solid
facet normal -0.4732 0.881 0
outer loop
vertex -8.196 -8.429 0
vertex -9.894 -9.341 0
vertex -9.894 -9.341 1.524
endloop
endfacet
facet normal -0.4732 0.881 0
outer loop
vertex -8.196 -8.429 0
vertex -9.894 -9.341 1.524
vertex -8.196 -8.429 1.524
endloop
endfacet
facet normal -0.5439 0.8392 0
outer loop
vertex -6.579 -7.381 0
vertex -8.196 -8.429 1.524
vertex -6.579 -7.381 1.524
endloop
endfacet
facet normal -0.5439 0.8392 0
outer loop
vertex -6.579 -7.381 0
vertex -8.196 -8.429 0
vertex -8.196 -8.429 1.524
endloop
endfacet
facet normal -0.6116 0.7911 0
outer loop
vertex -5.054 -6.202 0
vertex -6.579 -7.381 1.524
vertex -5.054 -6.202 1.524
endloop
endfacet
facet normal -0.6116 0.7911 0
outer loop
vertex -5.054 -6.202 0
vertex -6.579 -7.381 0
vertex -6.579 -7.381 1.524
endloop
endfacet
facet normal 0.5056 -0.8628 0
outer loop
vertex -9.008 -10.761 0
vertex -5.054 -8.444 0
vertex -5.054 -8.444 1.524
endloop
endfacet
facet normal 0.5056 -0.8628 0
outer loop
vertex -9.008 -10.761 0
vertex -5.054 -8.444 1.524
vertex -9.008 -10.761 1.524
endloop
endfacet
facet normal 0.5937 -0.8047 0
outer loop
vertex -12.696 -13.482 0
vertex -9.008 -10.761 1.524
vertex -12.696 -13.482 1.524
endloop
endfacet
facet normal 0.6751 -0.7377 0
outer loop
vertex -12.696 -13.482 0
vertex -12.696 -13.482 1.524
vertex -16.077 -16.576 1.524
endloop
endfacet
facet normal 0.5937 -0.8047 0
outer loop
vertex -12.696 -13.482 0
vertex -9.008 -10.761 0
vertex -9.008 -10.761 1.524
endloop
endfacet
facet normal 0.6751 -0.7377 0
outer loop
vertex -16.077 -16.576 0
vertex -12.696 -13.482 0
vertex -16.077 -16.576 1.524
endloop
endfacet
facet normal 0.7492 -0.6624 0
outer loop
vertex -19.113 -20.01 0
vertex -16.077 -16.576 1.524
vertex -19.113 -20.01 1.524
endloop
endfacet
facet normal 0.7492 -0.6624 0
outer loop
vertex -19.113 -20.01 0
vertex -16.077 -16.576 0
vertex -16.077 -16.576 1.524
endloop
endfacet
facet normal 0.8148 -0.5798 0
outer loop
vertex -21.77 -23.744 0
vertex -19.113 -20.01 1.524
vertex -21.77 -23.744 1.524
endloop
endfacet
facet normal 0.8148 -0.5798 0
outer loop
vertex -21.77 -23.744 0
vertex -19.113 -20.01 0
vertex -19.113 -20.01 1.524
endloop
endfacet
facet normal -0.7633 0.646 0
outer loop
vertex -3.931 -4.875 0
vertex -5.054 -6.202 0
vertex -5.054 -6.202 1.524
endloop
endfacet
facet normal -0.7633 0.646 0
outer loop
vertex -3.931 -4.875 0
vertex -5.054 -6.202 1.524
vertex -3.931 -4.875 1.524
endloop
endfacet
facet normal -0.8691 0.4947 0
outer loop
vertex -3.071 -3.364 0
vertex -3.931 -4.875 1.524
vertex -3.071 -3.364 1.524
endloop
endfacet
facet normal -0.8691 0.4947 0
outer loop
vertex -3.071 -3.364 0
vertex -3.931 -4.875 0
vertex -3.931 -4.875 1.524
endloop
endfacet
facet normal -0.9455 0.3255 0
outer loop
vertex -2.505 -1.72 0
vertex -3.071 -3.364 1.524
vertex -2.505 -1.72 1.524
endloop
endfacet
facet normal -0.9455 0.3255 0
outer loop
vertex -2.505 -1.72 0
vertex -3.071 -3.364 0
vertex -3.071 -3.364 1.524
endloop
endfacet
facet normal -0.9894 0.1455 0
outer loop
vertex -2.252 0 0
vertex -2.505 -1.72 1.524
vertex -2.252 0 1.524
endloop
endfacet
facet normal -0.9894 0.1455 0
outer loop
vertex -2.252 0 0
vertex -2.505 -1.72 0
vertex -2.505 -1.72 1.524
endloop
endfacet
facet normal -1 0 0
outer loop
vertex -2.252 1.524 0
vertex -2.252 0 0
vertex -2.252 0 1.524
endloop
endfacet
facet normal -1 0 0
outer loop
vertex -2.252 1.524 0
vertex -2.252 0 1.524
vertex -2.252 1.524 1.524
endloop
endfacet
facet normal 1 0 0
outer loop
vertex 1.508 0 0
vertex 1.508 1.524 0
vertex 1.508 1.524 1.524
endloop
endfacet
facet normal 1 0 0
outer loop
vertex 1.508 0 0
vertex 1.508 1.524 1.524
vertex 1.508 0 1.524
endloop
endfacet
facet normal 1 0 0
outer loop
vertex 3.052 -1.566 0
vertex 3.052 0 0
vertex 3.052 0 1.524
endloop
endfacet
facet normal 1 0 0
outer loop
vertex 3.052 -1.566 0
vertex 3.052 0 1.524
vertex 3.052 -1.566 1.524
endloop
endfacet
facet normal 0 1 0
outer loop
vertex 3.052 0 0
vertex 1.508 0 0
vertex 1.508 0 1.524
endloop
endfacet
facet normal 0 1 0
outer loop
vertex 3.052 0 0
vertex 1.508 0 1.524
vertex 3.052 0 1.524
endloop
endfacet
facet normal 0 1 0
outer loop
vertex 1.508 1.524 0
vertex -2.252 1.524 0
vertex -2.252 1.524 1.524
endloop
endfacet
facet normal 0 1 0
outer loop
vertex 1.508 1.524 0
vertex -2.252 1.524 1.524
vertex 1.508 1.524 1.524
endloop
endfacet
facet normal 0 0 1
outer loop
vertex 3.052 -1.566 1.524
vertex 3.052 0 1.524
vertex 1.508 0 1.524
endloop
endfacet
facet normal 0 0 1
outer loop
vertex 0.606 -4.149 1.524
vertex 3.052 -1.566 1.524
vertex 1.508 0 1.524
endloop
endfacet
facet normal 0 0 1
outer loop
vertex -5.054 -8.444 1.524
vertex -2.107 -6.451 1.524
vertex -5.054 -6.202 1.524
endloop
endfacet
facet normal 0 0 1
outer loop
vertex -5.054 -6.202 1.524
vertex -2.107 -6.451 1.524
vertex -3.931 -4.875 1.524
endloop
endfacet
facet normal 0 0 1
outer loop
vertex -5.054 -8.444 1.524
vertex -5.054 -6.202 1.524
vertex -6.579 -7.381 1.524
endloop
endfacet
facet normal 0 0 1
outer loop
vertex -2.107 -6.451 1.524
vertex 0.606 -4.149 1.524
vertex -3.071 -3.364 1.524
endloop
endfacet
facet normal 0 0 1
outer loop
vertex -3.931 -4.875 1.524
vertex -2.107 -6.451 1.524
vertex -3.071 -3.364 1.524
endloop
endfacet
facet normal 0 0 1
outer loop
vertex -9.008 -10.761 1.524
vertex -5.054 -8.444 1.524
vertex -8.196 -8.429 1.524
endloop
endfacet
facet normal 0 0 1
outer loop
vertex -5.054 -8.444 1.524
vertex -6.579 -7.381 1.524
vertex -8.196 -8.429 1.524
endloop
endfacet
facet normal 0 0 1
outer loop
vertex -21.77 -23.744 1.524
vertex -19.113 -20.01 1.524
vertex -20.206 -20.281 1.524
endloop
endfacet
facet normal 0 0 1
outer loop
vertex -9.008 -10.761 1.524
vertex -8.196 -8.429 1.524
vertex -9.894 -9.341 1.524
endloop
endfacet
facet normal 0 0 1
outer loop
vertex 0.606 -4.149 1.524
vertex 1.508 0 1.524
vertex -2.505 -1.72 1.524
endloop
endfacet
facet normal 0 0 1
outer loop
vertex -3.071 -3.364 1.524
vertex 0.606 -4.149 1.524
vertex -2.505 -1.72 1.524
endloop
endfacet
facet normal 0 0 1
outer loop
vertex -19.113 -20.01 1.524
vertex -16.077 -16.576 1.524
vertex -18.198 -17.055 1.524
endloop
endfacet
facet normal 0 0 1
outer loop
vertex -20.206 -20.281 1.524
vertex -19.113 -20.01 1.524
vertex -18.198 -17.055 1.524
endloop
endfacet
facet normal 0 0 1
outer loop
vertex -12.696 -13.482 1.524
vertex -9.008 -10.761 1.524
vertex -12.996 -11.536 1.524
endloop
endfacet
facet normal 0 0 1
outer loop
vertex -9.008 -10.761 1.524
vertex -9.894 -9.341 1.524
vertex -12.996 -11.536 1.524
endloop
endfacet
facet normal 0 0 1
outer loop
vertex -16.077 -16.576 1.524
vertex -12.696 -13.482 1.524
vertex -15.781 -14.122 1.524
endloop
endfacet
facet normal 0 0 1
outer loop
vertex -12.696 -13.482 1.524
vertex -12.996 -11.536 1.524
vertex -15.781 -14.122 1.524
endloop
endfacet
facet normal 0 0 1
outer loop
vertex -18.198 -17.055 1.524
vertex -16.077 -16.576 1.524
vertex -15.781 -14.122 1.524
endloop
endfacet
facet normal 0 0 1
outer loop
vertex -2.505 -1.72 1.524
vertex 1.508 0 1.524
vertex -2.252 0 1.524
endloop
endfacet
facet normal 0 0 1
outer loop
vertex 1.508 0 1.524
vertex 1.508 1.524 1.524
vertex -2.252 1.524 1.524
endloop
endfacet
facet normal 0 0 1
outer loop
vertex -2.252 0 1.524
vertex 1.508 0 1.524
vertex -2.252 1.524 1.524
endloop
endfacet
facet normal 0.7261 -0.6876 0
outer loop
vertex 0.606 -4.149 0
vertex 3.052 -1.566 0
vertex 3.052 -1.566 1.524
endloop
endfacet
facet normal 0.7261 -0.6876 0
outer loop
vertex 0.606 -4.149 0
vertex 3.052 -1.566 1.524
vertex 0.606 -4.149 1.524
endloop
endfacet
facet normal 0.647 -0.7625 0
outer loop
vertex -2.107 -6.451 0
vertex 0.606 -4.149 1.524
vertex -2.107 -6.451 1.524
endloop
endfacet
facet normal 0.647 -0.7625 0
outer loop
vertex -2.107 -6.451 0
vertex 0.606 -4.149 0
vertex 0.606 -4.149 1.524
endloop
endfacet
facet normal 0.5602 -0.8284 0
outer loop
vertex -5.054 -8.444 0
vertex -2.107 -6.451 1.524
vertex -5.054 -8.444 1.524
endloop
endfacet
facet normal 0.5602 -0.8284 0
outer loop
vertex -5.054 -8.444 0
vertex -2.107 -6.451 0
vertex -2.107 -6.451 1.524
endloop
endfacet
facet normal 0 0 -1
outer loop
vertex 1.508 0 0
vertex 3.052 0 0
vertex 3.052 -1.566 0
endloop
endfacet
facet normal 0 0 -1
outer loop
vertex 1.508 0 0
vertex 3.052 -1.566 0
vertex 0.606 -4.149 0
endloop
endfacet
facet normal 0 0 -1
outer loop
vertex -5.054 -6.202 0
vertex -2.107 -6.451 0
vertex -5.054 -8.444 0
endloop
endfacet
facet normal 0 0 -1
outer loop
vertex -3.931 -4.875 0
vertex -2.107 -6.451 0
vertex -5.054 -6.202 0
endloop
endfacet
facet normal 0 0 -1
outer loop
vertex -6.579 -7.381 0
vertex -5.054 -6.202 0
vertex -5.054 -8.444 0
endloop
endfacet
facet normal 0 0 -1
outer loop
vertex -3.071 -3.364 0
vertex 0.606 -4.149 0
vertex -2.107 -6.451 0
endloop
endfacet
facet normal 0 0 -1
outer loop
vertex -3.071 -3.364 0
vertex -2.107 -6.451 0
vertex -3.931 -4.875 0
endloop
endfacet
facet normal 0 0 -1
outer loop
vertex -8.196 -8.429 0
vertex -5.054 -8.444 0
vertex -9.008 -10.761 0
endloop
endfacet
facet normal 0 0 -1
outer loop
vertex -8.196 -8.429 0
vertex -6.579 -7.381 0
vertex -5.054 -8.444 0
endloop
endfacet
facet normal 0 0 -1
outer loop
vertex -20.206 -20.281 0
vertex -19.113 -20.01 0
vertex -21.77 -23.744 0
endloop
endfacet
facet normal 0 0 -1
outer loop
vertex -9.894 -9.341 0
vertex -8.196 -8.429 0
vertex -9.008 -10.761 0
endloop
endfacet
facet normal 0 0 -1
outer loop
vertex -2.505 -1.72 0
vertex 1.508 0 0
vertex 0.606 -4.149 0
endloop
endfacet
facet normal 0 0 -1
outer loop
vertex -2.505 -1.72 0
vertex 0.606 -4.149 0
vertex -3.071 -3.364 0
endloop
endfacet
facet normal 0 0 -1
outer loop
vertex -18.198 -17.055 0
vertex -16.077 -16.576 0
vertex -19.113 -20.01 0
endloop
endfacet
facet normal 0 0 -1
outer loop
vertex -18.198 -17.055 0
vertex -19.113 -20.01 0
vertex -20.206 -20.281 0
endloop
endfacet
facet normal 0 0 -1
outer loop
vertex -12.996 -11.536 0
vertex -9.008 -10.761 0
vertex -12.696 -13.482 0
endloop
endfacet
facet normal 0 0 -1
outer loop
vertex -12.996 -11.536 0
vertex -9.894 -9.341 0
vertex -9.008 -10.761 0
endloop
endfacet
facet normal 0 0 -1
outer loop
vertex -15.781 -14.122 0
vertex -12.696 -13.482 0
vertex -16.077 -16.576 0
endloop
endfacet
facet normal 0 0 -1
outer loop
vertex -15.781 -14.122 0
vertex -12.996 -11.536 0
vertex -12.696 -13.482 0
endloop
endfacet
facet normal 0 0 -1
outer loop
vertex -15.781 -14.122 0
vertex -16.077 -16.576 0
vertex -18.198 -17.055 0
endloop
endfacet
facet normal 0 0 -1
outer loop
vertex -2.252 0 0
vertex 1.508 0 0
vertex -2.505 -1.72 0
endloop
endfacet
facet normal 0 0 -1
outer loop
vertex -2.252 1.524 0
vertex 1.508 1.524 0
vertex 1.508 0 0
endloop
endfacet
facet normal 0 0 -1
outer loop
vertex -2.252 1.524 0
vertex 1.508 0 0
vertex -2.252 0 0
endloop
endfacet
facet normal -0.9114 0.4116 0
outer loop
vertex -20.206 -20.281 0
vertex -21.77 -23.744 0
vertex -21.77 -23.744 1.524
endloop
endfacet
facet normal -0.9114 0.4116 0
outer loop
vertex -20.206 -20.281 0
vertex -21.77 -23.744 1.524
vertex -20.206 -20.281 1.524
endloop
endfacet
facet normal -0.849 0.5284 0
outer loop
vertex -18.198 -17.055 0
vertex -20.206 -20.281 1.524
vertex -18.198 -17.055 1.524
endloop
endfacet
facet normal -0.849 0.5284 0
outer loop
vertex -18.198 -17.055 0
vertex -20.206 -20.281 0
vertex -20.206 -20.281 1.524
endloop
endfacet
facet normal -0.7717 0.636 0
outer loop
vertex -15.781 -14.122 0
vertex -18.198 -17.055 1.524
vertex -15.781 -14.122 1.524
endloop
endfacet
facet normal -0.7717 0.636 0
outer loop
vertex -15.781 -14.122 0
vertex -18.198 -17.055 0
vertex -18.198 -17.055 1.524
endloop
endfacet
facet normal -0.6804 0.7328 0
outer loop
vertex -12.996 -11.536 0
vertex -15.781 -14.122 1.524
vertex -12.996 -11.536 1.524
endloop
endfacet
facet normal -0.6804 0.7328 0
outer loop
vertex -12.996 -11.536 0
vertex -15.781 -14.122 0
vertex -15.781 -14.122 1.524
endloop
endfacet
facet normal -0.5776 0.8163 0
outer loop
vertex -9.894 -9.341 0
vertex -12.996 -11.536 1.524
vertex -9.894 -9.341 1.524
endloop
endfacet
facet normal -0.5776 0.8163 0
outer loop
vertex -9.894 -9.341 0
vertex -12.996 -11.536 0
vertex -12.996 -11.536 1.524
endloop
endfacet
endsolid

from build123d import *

# Parameters (mm, degrees)
BOSS_EXTRUDE1_DEPTH = 1.524


with BuildPart() as part:
    # Sketch1 → Boss-Extrude1 (new body)
    with BuildSketch(Plane.XY):
        with BuildLine():
            Line((1.507959842, 1.524), (1.507959842, 0))
            Line((1.507959842, 0), (3.052407177, 0))
            Line((3.052407177, 0), (3.052407177, -1.566256329))
            ThreePointArc((3.052407177, -1.566256329), (-0.719055485, -5.336831222), (-5.053668942, -8.443644993))
            ThreePointArc((-5.053668942, -8.443644993), (-14.427584678, -14.984368639), (-21.770031842, -23.744496018))
            ThreePointArc((-21.770031842, -23.744496018), (-17.037991297, -15.548436862), (-9.89443504, -9.340603312))
            ThreePointArc((-9.89443504, -9.340603312), (-7.376811542, -7.92151996), (-5.053668942, -6.202440528))
            ThreePointArc((-5.053668942, -6.202440528), (-3.071218913, -3.363942956), (-2.252033724, 0))
            Line((-2.252033724, 0), (-2.252033724, 1.524))
            Line((-2.252033724, 1.524), (1.507959842, 1.524))
        make_face()
    extrude(amount=BOSS_EXTRUDE1_DEPTH)


solid = part.part
